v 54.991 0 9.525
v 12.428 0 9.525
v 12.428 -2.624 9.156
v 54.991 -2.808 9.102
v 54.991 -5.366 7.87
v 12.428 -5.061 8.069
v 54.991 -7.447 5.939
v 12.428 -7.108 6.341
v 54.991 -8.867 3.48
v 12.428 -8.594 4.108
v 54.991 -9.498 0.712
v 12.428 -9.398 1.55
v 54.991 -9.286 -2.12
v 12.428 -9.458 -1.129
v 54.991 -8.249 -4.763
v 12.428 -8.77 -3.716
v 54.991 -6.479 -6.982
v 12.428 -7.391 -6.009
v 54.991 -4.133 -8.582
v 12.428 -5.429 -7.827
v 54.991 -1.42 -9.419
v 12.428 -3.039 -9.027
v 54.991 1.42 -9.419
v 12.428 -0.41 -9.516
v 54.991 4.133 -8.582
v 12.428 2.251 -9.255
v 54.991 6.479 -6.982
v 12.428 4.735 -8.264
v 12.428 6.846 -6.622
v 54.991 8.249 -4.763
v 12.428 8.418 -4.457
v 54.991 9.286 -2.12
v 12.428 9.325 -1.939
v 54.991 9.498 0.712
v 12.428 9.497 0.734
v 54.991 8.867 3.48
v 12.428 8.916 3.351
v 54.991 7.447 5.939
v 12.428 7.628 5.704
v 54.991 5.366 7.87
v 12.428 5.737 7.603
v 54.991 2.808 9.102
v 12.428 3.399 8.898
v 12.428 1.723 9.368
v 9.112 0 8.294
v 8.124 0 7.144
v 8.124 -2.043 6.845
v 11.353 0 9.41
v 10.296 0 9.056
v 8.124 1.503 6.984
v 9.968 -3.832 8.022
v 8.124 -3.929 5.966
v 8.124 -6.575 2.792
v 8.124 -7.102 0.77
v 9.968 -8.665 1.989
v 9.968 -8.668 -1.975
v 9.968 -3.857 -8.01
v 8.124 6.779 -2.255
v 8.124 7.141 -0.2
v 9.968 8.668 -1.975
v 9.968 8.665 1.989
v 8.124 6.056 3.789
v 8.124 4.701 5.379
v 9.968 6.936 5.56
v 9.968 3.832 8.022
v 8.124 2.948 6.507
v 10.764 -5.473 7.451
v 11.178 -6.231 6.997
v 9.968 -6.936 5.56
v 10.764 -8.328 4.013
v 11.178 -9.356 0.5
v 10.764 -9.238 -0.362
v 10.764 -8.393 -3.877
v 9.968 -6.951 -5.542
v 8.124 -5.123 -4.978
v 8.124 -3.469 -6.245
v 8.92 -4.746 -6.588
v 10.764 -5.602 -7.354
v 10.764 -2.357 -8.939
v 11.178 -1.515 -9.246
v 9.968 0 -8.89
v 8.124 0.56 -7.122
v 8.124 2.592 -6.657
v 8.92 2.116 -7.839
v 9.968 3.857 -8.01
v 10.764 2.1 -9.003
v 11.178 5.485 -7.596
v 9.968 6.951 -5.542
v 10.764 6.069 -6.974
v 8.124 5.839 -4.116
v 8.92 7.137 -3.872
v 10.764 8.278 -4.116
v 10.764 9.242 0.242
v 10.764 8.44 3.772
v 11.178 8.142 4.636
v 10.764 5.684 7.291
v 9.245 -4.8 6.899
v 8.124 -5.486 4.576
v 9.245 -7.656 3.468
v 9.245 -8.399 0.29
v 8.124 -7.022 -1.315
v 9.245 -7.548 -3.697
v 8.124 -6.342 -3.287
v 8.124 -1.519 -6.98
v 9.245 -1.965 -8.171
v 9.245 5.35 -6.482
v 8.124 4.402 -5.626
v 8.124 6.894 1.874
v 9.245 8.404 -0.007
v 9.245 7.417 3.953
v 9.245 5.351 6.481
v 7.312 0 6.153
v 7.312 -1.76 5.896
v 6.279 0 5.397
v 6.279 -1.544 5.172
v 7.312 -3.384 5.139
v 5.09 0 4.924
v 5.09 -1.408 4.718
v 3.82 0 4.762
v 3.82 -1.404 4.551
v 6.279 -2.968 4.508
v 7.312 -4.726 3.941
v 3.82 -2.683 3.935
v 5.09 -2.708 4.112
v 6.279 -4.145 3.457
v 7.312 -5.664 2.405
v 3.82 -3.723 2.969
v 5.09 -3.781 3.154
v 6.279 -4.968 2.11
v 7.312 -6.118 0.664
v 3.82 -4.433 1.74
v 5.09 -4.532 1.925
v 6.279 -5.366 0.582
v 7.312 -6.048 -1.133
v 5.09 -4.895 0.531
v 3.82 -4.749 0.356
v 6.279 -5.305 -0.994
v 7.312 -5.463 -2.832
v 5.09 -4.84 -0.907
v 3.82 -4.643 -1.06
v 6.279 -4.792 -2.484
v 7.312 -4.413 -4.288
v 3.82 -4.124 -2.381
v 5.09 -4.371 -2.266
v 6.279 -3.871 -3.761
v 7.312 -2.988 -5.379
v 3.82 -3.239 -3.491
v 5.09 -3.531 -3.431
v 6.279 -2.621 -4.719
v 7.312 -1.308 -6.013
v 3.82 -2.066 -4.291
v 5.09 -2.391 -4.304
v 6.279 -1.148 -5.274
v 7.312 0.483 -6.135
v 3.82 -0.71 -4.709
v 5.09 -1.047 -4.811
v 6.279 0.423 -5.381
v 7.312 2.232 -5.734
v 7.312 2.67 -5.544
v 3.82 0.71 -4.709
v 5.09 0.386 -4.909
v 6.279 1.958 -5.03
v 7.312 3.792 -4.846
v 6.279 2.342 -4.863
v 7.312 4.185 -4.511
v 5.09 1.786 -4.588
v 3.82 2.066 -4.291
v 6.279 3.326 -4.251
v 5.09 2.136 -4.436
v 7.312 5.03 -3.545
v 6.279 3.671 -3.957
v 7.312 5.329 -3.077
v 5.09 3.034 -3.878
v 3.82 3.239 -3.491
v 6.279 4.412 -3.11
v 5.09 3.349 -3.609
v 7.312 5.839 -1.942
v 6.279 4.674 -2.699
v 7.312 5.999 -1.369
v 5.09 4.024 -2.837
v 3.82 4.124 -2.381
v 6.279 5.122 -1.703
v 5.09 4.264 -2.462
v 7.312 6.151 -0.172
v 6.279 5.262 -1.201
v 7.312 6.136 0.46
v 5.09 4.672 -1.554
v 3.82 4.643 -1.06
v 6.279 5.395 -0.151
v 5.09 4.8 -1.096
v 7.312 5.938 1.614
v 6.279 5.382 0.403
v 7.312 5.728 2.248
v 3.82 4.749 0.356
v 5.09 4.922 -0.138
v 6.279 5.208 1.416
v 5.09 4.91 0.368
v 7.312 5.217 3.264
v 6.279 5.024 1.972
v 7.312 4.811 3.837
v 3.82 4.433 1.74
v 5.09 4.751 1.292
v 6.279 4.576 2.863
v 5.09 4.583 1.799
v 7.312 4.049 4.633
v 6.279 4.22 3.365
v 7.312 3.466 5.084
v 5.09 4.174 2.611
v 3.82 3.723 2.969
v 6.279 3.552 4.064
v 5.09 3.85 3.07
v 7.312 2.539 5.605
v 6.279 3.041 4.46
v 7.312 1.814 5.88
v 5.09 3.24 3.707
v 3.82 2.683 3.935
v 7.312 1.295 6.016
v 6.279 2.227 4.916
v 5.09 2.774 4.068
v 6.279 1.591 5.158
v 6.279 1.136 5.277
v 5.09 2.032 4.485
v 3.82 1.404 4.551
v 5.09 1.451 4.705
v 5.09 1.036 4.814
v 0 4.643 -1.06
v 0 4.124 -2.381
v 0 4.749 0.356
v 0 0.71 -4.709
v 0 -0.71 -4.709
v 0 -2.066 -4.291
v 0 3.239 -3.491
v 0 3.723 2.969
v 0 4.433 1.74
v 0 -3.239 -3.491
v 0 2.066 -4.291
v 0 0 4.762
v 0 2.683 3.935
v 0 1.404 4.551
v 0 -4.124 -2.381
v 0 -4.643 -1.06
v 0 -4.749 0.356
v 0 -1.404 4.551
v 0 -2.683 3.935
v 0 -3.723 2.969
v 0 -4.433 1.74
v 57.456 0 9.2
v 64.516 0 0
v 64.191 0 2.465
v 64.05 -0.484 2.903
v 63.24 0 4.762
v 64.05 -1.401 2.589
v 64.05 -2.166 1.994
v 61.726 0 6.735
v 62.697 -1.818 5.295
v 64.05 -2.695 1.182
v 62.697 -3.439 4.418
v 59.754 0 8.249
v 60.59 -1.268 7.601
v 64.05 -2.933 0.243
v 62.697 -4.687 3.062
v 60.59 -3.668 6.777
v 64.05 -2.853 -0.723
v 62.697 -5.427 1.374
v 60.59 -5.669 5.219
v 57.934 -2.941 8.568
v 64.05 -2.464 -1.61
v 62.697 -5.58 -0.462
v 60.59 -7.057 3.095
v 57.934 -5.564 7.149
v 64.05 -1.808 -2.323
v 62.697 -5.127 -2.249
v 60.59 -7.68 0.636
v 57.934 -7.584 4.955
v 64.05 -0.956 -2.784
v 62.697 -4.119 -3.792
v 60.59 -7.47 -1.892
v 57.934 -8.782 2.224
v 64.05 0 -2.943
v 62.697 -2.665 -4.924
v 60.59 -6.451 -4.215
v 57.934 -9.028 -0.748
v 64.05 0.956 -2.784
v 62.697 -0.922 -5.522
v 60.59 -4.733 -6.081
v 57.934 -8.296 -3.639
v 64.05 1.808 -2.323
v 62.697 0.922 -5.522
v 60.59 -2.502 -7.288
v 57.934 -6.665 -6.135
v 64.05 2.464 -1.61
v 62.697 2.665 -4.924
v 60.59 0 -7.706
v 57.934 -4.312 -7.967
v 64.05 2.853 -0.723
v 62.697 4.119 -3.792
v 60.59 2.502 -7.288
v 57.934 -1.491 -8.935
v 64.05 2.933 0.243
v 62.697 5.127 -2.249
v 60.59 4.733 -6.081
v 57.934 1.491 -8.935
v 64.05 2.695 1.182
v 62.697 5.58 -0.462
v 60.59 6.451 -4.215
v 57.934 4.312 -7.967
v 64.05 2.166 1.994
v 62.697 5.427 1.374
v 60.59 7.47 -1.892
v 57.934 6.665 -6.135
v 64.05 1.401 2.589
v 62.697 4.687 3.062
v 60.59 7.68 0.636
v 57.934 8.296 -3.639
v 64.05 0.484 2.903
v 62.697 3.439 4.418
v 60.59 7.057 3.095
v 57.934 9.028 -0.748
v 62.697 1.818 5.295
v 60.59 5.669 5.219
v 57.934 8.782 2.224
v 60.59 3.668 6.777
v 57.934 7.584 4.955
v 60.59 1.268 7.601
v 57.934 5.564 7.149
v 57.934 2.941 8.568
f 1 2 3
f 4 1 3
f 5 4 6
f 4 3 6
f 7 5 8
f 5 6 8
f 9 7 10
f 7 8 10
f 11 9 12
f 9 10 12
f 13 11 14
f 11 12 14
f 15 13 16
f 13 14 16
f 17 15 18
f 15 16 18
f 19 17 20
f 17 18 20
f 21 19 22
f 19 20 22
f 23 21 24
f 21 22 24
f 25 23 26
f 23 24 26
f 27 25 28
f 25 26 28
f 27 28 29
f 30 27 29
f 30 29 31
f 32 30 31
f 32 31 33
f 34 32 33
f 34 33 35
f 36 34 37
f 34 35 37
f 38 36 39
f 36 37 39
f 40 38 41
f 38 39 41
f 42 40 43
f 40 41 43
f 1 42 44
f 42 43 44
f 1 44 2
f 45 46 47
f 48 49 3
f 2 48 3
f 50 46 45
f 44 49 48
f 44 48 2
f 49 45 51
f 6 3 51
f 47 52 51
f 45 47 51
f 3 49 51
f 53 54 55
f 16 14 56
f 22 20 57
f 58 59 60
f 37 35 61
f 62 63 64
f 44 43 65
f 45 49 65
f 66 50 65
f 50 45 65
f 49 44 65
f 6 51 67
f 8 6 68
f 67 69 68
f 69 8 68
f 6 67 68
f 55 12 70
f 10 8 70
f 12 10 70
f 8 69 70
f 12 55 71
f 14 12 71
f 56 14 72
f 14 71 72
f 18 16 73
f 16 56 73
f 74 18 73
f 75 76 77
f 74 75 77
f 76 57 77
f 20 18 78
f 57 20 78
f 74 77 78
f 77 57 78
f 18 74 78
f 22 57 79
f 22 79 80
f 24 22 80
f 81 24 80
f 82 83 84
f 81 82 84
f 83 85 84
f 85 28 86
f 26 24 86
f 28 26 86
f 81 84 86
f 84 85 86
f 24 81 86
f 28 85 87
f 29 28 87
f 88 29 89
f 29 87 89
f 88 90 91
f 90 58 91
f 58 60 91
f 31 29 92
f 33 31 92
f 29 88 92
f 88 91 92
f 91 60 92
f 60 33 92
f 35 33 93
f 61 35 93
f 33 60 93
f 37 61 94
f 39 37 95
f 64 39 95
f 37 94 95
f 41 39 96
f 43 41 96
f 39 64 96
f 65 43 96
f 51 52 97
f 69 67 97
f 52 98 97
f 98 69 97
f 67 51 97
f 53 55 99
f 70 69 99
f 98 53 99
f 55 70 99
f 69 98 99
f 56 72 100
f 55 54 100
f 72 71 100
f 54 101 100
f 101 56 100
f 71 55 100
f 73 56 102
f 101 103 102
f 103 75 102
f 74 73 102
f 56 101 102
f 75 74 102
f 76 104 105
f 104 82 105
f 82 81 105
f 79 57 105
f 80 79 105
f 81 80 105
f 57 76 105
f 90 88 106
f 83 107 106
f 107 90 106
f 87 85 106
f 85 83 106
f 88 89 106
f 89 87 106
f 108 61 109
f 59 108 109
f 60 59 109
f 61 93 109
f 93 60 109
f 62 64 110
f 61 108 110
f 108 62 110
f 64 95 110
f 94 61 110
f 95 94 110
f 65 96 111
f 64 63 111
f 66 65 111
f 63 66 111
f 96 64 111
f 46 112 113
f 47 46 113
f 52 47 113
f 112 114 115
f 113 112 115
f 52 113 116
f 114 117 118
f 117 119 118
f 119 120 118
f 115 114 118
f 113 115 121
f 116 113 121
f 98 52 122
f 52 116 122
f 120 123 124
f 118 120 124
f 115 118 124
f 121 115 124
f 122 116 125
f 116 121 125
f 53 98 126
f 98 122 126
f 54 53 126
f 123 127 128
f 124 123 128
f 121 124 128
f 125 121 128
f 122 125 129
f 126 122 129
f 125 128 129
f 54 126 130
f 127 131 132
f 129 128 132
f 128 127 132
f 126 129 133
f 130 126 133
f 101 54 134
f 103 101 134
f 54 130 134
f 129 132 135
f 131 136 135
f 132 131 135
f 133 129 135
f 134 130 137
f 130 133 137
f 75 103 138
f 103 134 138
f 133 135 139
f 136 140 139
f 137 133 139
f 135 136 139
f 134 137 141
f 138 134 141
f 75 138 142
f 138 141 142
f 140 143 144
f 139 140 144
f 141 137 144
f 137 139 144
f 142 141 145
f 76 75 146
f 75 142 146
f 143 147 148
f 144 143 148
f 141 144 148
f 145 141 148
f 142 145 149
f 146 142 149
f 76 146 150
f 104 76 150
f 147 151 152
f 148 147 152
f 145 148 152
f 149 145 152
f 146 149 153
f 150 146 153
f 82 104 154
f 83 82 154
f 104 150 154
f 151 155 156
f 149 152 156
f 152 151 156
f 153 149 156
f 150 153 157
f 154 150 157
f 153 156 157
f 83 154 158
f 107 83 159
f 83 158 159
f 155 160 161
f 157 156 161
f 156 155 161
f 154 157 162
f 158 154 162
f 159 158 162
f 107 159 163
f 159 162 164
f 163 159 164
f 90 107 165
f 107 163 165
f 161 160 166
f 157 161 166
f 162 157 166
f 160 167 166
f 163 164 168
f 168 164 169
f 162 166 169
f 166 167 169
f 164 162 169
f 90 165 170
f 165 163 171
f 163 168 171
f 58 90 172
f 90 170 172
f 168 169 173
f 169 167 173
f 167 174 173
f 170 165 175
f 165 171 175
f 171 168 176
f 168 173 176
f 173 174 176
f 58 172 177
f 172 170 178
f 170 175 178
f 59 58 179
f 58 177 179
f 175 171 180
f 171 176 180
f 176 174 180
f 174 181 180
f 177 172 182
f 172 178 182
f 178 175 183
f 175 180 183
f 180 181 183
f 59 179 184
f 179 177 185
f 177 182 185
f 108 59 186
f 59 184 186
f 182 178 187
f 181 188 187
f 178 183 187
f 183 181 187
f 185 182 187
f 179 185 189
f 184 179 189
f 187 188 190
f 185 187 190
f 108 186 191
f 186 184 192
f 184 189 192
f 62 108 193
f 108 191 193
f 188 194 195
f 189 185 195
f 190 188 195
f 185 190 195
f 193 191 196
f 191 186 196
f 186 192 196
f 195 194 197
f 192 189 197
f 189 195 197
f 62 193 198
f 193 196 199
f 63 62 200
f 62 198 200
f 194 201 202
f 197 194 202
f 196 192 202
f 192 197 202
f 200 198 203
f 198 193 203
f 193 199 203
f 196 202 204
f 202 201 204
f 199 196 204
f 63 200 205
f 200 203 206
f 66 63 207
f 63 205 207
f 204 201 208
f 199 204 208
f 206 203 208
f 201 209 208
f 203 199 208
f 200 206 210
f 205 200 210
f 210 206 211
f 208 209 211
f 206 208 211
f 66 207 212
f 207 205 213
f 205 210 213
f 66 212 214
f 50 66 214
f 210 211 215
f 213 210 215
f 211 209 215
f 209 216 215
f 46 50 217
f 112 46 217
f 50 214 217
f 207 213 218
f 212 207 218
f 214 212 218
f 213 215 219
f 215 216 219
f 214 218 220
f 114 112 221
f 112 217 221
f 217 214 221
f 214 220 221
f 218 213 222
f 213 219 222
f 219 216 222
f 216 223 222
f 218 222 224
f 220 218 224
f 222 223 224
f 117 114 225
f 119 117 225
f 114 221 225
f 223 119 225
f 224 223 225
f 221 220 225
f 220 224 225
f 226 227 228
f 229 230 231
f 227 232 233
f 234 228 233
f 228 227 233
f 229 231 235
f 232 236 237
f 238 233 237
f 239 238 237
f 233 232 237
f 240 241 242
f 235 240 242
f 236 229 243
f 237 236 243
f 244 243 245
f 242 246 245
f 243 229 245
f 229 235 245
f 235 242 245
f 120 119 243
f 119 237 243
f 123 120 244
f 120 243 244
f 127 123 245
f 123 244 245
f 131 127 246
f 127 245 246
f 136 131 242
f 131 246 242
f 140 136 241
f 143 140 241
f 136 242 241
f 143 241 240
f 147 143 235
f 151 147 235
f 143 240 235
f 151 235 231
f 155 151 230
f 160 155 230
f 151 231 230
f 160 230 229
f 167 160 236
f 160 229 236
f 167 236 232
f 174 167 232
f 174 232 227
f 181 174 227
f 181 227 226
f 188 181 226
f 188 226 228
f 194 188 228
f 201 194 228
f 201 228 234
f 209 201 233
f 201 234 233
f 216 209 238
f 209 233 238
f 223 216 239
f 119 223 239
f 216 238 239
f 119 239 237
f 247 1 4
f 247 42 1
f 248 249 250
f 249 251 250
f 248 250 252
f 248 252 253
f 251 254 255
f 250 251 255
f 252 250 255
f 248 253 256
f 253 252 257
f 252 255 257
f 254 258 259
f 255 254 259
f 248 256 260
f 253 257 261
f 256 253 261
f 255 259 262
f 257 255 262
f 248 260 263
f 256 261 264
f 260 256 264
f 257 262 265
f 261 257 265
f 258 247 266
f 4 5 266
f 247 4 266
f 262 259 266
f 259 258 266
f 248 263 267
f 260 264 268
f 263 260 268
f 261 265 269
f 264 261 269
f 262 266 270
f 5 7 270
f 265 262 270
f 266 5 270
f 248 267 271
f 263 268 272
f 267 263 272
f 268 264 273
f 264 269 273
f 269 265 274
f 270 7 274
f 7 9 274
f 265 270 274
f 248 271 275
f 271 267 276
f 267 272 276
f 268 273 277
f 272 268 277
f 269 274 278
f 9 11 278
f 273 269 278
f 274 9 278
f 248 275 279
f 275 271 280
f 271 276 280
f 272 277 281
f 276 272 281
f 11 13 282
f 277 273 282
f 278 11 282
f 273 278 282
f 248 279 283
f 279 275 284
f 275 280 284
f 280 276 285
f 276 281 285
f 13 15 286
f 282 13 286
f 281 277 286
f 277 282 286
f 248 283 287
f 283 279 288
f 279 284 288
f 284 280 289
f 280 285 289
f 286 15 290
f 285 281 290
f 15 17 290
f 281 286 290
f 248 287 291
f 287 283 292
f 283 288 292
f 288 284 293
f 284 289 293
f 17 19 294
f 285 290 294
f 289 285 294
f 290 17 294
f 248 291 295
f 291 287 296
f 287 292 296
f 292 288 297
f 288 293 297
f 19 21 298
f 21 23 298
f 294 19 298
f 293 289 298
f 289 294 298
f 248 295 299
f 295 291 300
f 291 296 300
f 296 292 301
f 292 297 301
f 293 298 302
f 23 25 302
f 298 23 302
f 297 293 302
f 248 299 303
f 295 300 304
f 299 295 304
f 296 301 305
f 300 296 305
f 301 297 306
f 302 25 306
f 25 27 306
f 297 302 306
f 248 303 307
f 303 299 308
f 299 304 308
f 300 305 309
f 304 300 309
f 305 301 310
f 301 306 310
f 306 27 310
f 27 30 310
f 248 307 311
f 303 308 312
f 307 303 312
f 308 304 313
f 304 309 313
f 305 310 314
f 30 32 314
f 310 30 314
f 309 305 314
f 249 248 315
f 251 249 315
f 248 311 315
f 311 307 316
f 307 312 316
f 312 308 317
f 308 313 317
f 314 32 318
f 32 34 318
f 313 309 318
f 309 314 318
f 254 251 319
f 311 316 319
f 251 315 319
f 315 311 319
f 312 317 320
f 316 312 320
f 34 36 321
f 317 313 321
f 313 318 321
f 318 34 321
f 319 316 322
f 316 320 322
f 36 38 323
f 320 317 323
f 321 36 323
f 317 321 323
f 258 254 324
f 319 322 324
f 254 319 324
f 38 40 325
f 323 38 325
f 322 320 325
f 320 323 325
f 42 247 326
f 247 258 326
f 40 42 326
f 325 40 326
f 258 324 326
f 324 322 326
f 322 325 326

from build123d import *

# Parameters (mm, degrees)
F2_R = 9.525
F4_R = 5.08


# Not quite as in the source:
# - a fillet or chamfer that OpenCascade refuses, or shapes differently, is made with other operations: its cross-section is extruded or revolved along the edge and cut away or added


with BuildPart() as f1:
    # F0 (on Front) → F1 (revolve)
    with BuildSketch(Plane.XZ):
        Polygon((0, 4.7625), (0, 0), (64.516, 0), (64.516, 9.525), (8.89, 9.525), (8.89, 4.7625), align=None)
    revolve(axis=Axis((32.258, 0, 0), (1, 0, 0)))

    # F2
    f2_edges = [f1.edges().sort_by_distance(p)[0] for p in [
        (64.516, 0, -9.525),
    ]]
    fillet(f2_edges, radius=F2_R)

    # F3: fillet of radius 5.08 on 1 edges, made by hand

    # F3_s1 → F3_t2 (revolve)
    with BuildSketch(Plane.XZ):
        with BuildLine():
            ThreePointArc((8.89, 9.525), (7.2979698235, 6.1398455468), (3.8199315833, 4.7625))
            Line((3.8199315833, 4.7625), (8.89, 4.7625))
            Line((8.89, 4.7625), (8.89, 9.525))
        make_face()
    revolve(axis=Axis((8.89, 0, 0), (1, 0, 0)))

    # F4
    f4_edges = [f1.edges().sort_by_distance(p)[0] for p in [
        (8.89, 0, -9.525),
    ]]
    fillet(f4_edges, radius=F4_R)


solid = f1.part
